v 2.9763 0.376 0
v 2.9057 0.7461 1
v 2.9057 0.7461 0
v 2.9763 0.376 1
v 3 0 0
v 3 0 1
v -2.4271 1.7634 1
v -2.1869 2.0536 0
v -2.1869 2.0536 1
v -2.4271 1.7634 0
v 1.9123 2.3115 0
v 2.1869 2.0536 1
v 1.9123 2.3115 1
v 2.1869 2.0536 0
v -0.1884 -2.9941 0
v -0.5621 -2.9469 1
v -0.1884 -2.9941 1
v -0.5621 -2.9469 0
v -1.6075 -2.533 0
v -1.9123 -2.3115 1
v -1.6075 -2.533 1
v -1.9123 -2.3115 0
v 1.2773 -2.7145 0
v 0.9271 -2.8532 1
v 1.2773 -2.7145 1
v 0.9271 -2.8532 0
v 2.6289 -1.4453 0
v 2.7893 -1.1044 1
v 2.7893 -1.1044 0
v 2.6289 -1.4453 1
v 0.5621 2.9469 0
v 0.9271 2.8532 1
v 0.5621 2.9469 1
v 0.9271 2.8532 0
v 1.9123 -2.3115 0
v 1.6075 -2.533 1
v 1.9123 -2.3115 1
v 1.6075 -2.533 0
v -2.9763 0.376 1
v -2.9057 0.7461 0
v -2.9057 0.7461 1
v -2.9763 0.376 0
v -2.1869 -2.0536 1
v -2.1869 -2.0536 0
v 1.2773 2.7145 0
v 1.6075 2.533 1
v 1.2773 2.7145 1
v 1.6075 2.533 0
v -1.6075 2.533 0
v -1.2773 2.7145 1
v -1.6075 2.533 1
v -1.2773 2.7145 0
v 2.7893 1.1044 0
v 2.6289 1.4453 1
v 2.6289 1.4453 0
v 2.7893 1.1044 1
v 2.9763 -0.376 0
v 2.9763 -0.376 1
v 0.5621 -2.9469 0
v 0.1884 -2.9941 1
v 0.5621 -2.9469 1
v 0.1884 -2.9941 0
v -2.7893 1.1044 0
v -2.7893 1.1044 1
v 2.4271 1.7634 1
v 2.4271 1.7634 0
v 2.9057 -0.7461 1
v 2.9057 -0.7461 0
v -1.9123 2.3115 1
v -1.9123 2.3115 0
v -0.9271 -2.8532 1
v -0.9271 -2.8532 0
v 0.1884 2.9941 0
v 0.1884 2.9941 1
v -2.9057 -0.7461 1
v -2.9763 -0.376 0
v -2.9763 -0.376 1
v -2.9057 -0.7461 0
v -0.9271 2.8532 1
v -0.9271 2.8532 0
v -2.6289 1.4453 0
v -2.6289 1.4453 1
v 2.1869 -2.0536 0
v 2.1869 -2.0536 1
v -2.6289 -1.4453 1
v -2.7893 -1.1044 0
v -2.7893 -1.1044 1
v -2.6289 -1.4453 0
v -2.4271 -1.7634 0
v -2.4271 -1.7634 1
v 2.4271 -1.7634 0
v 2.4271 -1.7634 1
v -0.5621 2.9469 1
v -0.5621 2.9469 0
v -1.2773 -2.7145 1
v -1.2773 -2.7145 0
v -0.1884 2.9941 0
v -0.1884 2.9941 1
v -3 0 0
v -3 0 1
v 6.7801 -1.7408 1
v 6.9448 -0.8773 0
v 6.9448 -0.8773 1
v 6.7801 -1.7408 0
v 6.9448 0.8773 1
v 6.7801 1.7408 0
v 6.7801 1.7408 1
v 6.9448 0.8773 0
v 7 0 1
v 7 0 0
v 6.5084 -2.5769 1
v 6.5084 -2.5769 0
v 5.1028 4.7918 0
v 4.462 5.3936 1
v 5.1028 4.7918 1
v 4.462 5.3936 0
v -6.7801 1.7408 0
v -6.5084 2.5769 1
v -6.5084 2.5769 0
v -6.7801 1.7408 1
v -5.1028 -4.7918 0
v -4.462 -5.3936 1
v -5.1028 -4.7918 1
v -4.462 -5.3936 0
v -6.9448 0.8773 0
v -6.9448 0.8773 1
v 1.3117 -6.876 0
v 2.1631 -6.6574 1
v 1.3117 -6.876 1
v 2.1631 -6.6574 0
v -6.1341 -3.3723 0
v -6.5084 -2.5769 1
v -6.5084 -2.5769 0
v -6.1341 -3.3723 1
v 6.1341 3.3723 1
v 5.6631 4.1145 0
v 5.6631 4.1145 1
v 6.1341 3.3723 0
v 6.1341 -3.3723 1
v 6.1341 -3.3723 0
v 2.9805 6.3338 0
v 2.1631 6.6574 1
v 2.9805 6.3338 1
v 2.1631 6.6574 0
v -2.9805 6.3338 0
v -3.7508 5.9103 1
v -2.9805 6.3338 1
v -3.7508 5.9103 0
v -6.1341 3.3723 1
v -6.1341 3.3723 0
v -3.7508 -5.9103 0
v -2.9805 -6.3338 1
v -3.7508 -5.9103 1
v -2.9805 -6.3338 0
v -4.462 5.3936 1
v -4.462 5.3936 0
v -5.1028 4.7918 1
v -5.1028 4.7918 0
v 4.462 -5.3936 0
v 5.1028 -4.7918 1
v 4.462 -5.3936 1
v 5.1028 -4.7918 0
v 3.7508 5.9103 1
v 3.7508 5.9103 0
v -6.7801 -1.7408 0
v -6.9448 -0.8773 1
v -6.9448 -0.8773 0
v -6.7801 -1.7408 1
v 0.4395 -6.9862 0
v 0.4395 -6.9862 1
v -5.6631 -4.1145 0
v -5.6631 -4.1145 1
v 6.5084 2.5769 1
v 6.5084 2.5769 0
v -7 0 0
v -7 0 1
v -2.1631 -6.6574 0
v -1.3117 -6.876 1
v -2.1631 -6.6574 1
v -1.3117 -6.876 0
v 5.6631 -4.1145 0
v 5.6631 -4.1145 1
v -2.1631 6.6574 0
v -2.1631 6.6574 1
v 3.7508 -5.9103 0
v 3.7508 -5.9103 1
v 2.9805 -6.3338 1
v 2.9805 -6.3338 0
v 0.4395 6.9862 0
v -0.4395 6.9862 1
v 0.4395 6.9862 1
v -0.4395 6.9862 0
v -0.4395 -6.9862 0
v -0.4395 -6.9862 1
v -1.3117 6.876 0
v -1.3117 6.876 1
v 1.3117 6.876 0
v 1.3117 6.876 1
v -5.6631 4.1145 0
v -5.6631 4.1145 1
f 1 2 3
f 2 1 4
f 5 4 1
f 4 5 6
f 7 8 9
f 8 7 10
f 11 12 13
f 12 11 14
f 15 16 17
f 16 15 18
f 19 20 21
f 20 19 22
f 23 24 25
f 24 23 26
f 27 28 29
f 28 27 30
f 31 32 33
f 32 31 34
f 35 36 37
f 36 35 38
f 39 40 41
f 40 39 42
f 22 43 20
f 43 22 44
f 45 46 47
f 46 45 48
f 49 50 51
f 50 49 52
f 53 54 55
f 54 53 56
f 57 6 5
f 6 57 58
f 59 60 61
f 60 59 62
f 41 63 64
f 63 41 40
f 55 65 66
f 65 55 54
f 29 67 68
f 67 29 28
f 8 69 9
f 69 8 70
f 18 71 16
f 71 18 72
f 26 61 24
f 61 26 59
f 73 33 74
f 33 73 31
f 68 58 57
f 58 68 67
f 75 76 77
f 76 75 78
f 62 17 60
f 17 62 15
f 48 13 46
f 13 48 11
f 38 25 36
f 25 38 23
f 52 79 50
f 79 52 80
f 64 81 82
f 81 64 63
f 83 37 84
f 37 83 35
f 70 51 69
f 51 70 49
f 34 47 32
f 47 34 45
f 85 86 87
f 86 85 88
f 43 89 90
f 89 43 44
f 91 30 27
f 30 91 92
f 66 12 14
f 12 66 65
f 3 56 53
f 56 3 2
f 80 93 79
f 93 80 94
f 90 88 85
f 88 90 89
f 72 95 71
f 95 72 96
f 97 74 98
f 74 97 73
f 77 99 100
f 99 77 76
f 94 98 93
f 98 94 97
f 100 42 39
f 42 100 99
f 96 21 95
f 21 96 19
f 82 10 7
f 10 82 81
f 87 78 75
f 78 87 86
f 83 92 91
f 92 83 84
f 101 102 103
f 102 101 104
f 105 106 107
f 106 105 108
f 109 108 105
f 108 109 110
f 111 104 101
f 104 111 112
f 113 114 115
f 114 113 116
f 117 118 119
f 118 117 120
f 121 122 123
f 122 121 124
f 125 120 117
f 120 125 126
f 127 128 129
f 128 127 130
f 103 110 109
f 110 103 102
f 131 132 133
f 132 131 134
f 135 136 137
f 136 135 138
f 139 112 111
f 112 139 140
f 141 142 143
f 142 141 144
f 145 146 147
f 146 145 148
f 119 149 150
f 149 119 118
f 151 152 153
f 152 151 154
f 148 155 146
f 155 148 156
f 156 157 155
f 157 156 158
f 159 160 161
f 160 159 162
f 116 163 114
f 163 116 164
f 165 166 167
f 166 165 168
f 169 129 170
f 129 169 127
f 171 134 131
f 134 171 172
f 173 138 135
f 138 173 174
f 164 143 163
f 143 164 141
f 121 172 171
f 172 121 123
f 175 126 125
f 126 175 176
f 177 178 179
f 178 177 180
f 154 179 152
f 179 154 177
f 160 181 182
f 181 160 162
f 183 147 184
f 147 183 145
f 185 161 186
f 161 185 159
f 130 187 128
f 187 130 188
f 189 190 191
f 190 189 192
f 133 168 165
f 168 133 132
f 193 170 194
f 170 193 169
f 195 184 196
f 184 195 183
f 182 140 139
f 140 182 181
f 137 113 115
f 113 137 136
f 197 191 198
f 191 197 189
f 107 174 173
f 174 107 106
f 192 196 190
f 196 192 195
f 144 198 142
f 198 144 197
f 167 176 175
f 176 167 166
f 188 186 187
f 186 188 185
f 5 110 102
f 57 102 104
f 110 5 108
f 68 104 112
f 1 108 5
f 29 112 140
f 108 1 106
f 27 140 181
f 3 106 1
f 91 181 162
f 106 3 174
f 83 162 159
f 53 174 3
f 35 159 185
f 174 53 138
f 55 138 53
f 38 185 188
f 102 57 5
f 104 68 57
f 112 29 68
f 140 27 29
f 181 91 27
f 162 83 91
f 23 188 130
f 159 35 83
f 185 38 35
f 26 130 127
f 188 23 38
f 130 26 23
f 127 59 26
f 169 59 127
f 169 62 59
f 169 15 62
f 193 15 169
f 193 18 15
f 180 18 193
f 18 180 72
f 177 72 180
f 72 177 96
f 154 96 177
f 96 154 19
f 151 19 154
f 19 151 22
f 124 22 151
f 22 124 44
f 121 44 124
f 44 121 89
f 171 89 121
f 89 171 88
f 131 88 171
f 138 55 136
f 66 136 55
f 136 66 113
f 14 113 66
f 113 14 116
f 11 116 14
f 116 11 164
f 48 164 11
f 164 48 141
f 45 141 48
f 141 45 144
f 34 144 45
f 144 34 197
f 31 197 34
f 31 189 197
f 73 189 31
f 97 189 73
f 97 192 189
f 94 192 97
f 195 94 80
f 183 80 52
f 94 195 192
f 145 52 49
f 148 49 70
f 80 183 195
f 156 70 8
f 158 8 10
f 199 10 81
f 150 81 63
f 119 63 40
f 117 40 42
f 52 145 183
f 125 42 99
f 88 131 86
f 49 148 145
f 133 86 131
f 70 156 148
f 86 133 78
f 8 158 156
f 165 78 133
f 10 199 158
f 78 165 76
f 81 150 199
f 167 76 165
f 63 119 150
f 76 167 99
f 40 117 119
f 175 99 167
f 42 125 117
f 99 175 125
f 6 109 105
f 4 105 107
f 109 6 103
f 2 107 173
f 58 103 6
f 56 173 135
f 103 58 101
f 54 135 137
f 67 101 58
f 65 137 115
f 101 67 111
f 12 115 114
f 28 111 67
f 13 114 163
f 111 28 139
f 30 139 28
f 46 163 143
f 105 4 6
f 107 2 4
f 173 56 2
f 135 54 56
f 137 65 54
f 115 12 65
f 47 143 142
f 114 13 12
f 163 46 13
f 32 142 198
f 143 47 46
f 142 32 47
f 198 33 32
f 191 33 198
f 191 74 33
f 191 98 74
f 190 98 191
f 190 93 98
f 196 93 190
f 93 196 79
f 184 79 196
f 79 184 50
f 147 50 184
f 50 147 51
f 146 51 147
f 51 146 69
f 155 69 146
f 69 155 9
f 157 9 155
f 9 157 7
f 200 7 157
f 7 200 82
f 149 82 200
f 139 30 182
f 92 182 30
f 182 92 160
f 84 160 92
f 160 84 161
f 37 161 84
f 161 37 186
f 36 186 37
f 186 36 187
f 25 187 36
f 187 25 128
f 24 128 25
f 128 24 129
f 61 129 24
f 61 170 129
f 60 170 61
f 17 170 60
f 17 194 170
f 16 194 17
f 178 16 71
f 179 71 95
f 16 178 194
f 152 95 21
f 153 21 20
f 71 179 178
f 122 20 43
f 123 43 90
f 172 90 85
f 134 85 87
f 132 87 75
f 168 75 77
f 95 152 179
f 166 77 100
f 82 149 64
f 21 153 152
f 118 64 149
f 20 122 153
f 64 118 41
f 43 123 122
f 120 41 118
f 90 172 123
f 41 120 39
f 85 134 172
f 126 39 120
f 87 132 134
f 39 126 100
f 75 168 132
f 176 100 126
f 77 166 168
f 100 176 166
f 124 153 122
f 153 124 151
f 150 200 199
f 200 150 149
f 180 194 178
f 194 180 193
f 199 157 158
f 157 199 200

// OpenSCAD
$fn = 50;


difference() {
	union() {
		cylinder(h = 1, r = 7.0000000000);
	}
	union() {
		translate(v = [0.0000000000, 0.0000000000, -100.0000000000]) {
			cylinder(h = 200, r = 3.0000000000);
		}
		translate(v = [0.0000000000, 0.0000000000, -100.0000000000]) {
			cylinder(h = 200, r = 1.5000000000);
		}
		translate(v = [0.0000000000, 0.0000000000, -100.0000000000]) {
			cylinder(h = 200, r = 1.5000000000);
		}
		translate(v = [0.0000000000, 0.0000000000, -100.0000000000]) {
			cylinder(h = 200, r = 1.5000000000);
		}
	}
}
